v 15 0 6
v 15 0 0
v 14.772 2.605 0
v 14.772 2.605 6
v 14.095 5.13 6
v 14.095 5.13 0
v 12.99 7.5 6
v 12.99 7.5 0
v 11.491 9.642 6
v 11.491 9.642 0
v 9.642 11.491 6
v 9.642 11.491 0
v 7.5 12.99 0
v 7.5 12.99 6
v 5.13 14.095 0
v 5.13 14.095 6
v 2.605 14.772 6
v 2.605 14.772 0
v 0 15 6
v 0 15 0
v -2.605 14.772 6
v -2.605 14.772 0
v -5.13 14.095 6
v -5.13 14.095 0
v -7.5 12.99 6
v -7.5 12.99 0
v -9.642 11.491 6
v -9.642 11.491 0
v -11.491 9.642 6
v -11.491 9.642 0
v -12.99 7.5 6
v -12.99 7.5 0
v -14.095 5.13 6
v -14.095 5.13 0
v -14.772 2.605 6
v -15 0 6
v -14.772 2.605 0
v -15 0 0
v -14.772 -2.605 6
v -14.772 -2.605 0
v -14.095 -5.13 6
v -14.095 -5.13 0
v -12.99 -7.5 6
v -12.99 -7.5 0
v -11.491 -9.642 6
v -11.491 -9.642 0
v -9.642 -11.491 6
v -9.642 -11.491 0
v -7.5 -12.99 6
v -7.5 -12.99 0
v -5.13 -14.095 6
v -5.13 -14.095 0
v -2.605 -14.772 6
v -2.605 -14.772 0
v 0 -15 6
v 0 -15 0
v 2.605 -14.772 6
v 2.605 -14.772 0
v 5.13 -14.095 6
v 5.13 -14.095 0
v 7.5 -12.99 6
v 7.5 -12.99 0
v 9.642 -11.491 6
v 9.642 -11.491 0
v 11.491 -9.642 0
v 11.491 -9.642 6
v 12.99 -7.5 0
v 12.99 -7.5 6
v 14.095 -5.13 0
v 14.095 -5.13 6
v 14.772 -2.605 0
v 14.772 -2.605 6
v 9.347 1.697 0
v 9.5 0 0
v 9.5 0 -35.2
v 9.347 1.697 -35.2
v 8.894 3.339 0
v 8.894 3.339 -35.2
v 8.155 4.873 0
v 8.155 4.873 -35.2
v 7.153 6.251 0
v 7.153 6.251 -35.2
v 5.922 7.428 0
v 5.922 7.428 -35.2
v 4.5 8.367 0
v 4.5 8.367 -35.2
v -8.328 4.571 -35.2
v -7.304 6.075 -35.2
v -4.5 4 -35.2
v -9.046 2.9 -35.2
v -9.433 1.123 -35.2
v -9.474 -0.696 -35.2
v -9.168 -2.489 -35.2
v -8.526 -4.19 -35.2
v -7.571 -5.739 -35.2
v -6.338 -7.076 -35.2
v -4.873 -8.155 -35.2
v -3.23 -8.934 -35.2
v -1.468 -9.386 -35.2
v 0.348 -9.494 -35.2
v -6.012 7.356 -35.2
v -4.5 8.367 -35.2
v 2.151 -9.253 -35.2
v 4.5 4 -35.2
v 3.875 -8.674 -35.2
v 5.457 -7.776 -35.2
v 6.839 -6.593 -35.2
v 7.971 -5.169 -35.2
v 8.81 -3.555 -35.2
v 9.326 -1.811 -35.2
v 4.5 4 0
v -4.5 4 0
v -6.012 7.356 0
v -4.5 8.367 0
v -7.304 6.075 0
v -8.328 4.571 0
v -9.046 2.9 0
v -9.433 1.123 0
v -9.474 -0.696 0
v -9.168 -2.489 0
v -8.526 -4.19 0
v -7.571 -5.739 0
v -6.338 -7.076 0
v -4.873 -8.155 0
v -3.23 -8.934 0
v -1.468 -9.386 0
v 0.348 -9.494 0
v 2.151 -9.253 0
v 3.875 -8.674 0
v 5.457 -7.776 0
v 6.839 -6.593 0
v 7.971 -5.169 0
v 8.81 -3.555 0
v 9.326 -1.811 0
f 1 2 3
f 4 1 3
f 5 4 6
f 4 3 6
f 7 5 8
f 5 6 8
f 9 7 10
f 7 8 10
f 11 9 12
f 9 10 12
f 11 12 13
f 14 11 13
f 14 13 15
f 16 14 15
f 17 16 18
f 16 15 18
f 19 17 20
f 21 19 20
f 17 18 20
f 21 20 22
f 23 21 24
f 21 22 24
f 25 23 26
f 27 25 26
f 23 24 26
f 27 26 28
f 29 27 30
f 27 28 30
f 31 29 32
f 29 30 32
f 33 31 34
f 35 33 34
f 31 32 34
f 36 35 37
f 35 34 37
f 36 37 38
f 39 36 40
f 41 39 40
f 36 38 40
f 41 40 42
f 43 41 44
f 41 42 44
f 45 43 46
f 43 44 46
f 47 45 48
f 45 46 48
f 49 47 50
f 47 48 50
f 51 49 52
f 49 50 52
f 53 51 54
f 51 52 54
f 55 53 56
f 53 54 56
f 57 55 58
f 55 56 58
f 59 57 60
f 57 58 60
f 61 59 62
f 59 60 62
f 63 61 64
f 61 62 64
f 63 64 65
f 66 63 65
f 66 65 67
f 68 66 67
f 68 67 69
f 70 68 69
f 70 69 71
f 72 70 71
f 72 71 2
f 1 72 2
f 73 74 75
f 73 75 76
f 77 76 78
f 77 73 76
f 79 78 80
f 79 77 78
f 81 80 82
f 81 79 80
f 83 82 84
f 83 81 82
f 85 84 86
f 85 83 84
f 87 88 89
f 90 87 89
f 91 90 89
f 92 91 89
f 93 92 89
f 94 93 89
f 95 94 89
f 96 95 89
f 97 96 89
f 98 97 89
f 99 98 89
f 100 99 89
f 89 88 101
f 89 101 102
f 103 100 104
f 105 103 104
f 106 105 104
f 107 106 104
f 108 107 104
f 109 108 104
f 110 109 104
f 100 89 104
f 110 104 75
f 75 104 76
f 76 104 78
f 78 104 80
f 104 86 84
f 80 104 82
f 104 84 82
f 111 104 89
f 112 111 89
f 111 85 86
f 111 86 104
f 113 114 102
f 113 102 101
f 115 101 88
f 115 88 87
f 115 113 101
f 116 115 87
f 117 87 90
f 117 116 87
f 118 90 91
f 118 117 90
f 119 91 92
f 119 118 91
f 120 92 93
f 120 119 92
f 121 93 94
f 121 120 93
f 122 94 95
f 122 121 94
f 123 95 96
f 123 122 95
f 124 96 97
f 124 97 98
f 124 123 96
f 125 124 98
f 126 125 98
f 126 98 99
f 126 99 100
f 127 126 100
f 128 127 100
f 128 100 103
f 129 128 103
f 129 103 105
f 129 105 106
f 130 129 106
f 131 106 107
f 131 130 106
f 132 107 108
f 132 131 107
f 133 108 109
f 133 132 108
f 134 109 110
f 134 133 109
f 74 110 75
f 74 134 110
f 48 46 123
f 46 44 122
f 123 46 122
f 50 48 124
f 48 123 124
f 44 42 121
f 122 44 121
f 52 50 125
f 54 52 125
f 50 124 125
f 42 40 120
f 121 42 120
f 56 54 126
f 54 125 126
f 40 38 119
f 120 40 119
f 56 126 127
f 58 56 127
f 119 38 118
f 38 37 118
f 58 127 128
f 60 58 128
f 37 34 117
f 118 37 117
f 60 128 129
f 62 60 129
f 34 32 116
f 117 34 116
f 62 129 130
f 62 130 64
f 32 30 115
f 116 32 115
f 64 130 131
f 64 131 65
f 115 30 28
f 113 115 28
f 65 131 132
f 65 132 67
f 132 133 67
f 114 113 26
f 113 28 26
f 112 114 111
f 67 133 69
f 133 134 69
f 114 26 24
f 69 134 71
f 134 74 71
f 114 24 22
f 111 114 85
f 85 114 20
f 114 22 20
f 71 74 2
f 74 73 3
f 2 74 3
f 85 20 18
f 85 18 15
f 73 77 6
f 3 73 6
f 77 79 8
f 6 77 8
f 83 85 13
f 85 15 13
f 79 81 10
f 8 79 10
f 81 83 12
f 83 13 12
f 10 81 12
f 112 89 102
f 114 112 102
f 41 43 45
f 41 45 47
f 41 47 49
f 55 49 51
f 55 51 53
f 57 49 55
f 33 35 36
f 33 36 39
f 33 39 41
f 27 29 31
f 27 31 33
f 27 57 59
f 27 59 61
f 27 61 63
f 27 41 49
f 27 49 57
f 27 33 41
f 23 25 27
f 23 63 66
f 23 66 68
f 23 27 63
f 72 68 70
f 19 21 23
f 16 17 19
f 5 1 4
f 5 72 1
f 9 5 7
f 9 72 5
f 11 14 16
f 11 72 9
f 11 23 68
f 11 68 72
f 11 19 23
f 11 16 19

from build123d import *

# Parameters (mm, degrees)
SKETCH1_R           = 15
BOSS_EXTRUDE1_DEPTH = 6
BOSS_EXTRUDE2_DEPTH = 35.2


with BuildPart() as part:
    # Sketch1 → Boss-Extrude1 (new body)
    with BuildSketch(Plane.XY):
        Circle(SKETCH1_R)
    extrude(amount=BOSS_EXTRUDE1_DEPTH)

    # Sketch1<3> → Boss-Extrude2 (add)
    with BuildSketch(Plane.XY):
        with BuildLine():
            Line((4.5, 8.366600265), (4.5, 4))
            Line((4.5, 4), (-4.5, 4))
            Line((-4.5, 4), (-4.5, 8.366600265))
            ThreePointArc((-4.5, 8.366600265), (-4.873397172, -8.154753215), (9.5, 0))
            ThreePointArc((9.5, 0), (8.154753215, 4.873397172), (4.5, 8.366600265))
        make_face()
    extrude(amount=-BOSS_EXTRUDE2_DEPTH)


solid = part.part
